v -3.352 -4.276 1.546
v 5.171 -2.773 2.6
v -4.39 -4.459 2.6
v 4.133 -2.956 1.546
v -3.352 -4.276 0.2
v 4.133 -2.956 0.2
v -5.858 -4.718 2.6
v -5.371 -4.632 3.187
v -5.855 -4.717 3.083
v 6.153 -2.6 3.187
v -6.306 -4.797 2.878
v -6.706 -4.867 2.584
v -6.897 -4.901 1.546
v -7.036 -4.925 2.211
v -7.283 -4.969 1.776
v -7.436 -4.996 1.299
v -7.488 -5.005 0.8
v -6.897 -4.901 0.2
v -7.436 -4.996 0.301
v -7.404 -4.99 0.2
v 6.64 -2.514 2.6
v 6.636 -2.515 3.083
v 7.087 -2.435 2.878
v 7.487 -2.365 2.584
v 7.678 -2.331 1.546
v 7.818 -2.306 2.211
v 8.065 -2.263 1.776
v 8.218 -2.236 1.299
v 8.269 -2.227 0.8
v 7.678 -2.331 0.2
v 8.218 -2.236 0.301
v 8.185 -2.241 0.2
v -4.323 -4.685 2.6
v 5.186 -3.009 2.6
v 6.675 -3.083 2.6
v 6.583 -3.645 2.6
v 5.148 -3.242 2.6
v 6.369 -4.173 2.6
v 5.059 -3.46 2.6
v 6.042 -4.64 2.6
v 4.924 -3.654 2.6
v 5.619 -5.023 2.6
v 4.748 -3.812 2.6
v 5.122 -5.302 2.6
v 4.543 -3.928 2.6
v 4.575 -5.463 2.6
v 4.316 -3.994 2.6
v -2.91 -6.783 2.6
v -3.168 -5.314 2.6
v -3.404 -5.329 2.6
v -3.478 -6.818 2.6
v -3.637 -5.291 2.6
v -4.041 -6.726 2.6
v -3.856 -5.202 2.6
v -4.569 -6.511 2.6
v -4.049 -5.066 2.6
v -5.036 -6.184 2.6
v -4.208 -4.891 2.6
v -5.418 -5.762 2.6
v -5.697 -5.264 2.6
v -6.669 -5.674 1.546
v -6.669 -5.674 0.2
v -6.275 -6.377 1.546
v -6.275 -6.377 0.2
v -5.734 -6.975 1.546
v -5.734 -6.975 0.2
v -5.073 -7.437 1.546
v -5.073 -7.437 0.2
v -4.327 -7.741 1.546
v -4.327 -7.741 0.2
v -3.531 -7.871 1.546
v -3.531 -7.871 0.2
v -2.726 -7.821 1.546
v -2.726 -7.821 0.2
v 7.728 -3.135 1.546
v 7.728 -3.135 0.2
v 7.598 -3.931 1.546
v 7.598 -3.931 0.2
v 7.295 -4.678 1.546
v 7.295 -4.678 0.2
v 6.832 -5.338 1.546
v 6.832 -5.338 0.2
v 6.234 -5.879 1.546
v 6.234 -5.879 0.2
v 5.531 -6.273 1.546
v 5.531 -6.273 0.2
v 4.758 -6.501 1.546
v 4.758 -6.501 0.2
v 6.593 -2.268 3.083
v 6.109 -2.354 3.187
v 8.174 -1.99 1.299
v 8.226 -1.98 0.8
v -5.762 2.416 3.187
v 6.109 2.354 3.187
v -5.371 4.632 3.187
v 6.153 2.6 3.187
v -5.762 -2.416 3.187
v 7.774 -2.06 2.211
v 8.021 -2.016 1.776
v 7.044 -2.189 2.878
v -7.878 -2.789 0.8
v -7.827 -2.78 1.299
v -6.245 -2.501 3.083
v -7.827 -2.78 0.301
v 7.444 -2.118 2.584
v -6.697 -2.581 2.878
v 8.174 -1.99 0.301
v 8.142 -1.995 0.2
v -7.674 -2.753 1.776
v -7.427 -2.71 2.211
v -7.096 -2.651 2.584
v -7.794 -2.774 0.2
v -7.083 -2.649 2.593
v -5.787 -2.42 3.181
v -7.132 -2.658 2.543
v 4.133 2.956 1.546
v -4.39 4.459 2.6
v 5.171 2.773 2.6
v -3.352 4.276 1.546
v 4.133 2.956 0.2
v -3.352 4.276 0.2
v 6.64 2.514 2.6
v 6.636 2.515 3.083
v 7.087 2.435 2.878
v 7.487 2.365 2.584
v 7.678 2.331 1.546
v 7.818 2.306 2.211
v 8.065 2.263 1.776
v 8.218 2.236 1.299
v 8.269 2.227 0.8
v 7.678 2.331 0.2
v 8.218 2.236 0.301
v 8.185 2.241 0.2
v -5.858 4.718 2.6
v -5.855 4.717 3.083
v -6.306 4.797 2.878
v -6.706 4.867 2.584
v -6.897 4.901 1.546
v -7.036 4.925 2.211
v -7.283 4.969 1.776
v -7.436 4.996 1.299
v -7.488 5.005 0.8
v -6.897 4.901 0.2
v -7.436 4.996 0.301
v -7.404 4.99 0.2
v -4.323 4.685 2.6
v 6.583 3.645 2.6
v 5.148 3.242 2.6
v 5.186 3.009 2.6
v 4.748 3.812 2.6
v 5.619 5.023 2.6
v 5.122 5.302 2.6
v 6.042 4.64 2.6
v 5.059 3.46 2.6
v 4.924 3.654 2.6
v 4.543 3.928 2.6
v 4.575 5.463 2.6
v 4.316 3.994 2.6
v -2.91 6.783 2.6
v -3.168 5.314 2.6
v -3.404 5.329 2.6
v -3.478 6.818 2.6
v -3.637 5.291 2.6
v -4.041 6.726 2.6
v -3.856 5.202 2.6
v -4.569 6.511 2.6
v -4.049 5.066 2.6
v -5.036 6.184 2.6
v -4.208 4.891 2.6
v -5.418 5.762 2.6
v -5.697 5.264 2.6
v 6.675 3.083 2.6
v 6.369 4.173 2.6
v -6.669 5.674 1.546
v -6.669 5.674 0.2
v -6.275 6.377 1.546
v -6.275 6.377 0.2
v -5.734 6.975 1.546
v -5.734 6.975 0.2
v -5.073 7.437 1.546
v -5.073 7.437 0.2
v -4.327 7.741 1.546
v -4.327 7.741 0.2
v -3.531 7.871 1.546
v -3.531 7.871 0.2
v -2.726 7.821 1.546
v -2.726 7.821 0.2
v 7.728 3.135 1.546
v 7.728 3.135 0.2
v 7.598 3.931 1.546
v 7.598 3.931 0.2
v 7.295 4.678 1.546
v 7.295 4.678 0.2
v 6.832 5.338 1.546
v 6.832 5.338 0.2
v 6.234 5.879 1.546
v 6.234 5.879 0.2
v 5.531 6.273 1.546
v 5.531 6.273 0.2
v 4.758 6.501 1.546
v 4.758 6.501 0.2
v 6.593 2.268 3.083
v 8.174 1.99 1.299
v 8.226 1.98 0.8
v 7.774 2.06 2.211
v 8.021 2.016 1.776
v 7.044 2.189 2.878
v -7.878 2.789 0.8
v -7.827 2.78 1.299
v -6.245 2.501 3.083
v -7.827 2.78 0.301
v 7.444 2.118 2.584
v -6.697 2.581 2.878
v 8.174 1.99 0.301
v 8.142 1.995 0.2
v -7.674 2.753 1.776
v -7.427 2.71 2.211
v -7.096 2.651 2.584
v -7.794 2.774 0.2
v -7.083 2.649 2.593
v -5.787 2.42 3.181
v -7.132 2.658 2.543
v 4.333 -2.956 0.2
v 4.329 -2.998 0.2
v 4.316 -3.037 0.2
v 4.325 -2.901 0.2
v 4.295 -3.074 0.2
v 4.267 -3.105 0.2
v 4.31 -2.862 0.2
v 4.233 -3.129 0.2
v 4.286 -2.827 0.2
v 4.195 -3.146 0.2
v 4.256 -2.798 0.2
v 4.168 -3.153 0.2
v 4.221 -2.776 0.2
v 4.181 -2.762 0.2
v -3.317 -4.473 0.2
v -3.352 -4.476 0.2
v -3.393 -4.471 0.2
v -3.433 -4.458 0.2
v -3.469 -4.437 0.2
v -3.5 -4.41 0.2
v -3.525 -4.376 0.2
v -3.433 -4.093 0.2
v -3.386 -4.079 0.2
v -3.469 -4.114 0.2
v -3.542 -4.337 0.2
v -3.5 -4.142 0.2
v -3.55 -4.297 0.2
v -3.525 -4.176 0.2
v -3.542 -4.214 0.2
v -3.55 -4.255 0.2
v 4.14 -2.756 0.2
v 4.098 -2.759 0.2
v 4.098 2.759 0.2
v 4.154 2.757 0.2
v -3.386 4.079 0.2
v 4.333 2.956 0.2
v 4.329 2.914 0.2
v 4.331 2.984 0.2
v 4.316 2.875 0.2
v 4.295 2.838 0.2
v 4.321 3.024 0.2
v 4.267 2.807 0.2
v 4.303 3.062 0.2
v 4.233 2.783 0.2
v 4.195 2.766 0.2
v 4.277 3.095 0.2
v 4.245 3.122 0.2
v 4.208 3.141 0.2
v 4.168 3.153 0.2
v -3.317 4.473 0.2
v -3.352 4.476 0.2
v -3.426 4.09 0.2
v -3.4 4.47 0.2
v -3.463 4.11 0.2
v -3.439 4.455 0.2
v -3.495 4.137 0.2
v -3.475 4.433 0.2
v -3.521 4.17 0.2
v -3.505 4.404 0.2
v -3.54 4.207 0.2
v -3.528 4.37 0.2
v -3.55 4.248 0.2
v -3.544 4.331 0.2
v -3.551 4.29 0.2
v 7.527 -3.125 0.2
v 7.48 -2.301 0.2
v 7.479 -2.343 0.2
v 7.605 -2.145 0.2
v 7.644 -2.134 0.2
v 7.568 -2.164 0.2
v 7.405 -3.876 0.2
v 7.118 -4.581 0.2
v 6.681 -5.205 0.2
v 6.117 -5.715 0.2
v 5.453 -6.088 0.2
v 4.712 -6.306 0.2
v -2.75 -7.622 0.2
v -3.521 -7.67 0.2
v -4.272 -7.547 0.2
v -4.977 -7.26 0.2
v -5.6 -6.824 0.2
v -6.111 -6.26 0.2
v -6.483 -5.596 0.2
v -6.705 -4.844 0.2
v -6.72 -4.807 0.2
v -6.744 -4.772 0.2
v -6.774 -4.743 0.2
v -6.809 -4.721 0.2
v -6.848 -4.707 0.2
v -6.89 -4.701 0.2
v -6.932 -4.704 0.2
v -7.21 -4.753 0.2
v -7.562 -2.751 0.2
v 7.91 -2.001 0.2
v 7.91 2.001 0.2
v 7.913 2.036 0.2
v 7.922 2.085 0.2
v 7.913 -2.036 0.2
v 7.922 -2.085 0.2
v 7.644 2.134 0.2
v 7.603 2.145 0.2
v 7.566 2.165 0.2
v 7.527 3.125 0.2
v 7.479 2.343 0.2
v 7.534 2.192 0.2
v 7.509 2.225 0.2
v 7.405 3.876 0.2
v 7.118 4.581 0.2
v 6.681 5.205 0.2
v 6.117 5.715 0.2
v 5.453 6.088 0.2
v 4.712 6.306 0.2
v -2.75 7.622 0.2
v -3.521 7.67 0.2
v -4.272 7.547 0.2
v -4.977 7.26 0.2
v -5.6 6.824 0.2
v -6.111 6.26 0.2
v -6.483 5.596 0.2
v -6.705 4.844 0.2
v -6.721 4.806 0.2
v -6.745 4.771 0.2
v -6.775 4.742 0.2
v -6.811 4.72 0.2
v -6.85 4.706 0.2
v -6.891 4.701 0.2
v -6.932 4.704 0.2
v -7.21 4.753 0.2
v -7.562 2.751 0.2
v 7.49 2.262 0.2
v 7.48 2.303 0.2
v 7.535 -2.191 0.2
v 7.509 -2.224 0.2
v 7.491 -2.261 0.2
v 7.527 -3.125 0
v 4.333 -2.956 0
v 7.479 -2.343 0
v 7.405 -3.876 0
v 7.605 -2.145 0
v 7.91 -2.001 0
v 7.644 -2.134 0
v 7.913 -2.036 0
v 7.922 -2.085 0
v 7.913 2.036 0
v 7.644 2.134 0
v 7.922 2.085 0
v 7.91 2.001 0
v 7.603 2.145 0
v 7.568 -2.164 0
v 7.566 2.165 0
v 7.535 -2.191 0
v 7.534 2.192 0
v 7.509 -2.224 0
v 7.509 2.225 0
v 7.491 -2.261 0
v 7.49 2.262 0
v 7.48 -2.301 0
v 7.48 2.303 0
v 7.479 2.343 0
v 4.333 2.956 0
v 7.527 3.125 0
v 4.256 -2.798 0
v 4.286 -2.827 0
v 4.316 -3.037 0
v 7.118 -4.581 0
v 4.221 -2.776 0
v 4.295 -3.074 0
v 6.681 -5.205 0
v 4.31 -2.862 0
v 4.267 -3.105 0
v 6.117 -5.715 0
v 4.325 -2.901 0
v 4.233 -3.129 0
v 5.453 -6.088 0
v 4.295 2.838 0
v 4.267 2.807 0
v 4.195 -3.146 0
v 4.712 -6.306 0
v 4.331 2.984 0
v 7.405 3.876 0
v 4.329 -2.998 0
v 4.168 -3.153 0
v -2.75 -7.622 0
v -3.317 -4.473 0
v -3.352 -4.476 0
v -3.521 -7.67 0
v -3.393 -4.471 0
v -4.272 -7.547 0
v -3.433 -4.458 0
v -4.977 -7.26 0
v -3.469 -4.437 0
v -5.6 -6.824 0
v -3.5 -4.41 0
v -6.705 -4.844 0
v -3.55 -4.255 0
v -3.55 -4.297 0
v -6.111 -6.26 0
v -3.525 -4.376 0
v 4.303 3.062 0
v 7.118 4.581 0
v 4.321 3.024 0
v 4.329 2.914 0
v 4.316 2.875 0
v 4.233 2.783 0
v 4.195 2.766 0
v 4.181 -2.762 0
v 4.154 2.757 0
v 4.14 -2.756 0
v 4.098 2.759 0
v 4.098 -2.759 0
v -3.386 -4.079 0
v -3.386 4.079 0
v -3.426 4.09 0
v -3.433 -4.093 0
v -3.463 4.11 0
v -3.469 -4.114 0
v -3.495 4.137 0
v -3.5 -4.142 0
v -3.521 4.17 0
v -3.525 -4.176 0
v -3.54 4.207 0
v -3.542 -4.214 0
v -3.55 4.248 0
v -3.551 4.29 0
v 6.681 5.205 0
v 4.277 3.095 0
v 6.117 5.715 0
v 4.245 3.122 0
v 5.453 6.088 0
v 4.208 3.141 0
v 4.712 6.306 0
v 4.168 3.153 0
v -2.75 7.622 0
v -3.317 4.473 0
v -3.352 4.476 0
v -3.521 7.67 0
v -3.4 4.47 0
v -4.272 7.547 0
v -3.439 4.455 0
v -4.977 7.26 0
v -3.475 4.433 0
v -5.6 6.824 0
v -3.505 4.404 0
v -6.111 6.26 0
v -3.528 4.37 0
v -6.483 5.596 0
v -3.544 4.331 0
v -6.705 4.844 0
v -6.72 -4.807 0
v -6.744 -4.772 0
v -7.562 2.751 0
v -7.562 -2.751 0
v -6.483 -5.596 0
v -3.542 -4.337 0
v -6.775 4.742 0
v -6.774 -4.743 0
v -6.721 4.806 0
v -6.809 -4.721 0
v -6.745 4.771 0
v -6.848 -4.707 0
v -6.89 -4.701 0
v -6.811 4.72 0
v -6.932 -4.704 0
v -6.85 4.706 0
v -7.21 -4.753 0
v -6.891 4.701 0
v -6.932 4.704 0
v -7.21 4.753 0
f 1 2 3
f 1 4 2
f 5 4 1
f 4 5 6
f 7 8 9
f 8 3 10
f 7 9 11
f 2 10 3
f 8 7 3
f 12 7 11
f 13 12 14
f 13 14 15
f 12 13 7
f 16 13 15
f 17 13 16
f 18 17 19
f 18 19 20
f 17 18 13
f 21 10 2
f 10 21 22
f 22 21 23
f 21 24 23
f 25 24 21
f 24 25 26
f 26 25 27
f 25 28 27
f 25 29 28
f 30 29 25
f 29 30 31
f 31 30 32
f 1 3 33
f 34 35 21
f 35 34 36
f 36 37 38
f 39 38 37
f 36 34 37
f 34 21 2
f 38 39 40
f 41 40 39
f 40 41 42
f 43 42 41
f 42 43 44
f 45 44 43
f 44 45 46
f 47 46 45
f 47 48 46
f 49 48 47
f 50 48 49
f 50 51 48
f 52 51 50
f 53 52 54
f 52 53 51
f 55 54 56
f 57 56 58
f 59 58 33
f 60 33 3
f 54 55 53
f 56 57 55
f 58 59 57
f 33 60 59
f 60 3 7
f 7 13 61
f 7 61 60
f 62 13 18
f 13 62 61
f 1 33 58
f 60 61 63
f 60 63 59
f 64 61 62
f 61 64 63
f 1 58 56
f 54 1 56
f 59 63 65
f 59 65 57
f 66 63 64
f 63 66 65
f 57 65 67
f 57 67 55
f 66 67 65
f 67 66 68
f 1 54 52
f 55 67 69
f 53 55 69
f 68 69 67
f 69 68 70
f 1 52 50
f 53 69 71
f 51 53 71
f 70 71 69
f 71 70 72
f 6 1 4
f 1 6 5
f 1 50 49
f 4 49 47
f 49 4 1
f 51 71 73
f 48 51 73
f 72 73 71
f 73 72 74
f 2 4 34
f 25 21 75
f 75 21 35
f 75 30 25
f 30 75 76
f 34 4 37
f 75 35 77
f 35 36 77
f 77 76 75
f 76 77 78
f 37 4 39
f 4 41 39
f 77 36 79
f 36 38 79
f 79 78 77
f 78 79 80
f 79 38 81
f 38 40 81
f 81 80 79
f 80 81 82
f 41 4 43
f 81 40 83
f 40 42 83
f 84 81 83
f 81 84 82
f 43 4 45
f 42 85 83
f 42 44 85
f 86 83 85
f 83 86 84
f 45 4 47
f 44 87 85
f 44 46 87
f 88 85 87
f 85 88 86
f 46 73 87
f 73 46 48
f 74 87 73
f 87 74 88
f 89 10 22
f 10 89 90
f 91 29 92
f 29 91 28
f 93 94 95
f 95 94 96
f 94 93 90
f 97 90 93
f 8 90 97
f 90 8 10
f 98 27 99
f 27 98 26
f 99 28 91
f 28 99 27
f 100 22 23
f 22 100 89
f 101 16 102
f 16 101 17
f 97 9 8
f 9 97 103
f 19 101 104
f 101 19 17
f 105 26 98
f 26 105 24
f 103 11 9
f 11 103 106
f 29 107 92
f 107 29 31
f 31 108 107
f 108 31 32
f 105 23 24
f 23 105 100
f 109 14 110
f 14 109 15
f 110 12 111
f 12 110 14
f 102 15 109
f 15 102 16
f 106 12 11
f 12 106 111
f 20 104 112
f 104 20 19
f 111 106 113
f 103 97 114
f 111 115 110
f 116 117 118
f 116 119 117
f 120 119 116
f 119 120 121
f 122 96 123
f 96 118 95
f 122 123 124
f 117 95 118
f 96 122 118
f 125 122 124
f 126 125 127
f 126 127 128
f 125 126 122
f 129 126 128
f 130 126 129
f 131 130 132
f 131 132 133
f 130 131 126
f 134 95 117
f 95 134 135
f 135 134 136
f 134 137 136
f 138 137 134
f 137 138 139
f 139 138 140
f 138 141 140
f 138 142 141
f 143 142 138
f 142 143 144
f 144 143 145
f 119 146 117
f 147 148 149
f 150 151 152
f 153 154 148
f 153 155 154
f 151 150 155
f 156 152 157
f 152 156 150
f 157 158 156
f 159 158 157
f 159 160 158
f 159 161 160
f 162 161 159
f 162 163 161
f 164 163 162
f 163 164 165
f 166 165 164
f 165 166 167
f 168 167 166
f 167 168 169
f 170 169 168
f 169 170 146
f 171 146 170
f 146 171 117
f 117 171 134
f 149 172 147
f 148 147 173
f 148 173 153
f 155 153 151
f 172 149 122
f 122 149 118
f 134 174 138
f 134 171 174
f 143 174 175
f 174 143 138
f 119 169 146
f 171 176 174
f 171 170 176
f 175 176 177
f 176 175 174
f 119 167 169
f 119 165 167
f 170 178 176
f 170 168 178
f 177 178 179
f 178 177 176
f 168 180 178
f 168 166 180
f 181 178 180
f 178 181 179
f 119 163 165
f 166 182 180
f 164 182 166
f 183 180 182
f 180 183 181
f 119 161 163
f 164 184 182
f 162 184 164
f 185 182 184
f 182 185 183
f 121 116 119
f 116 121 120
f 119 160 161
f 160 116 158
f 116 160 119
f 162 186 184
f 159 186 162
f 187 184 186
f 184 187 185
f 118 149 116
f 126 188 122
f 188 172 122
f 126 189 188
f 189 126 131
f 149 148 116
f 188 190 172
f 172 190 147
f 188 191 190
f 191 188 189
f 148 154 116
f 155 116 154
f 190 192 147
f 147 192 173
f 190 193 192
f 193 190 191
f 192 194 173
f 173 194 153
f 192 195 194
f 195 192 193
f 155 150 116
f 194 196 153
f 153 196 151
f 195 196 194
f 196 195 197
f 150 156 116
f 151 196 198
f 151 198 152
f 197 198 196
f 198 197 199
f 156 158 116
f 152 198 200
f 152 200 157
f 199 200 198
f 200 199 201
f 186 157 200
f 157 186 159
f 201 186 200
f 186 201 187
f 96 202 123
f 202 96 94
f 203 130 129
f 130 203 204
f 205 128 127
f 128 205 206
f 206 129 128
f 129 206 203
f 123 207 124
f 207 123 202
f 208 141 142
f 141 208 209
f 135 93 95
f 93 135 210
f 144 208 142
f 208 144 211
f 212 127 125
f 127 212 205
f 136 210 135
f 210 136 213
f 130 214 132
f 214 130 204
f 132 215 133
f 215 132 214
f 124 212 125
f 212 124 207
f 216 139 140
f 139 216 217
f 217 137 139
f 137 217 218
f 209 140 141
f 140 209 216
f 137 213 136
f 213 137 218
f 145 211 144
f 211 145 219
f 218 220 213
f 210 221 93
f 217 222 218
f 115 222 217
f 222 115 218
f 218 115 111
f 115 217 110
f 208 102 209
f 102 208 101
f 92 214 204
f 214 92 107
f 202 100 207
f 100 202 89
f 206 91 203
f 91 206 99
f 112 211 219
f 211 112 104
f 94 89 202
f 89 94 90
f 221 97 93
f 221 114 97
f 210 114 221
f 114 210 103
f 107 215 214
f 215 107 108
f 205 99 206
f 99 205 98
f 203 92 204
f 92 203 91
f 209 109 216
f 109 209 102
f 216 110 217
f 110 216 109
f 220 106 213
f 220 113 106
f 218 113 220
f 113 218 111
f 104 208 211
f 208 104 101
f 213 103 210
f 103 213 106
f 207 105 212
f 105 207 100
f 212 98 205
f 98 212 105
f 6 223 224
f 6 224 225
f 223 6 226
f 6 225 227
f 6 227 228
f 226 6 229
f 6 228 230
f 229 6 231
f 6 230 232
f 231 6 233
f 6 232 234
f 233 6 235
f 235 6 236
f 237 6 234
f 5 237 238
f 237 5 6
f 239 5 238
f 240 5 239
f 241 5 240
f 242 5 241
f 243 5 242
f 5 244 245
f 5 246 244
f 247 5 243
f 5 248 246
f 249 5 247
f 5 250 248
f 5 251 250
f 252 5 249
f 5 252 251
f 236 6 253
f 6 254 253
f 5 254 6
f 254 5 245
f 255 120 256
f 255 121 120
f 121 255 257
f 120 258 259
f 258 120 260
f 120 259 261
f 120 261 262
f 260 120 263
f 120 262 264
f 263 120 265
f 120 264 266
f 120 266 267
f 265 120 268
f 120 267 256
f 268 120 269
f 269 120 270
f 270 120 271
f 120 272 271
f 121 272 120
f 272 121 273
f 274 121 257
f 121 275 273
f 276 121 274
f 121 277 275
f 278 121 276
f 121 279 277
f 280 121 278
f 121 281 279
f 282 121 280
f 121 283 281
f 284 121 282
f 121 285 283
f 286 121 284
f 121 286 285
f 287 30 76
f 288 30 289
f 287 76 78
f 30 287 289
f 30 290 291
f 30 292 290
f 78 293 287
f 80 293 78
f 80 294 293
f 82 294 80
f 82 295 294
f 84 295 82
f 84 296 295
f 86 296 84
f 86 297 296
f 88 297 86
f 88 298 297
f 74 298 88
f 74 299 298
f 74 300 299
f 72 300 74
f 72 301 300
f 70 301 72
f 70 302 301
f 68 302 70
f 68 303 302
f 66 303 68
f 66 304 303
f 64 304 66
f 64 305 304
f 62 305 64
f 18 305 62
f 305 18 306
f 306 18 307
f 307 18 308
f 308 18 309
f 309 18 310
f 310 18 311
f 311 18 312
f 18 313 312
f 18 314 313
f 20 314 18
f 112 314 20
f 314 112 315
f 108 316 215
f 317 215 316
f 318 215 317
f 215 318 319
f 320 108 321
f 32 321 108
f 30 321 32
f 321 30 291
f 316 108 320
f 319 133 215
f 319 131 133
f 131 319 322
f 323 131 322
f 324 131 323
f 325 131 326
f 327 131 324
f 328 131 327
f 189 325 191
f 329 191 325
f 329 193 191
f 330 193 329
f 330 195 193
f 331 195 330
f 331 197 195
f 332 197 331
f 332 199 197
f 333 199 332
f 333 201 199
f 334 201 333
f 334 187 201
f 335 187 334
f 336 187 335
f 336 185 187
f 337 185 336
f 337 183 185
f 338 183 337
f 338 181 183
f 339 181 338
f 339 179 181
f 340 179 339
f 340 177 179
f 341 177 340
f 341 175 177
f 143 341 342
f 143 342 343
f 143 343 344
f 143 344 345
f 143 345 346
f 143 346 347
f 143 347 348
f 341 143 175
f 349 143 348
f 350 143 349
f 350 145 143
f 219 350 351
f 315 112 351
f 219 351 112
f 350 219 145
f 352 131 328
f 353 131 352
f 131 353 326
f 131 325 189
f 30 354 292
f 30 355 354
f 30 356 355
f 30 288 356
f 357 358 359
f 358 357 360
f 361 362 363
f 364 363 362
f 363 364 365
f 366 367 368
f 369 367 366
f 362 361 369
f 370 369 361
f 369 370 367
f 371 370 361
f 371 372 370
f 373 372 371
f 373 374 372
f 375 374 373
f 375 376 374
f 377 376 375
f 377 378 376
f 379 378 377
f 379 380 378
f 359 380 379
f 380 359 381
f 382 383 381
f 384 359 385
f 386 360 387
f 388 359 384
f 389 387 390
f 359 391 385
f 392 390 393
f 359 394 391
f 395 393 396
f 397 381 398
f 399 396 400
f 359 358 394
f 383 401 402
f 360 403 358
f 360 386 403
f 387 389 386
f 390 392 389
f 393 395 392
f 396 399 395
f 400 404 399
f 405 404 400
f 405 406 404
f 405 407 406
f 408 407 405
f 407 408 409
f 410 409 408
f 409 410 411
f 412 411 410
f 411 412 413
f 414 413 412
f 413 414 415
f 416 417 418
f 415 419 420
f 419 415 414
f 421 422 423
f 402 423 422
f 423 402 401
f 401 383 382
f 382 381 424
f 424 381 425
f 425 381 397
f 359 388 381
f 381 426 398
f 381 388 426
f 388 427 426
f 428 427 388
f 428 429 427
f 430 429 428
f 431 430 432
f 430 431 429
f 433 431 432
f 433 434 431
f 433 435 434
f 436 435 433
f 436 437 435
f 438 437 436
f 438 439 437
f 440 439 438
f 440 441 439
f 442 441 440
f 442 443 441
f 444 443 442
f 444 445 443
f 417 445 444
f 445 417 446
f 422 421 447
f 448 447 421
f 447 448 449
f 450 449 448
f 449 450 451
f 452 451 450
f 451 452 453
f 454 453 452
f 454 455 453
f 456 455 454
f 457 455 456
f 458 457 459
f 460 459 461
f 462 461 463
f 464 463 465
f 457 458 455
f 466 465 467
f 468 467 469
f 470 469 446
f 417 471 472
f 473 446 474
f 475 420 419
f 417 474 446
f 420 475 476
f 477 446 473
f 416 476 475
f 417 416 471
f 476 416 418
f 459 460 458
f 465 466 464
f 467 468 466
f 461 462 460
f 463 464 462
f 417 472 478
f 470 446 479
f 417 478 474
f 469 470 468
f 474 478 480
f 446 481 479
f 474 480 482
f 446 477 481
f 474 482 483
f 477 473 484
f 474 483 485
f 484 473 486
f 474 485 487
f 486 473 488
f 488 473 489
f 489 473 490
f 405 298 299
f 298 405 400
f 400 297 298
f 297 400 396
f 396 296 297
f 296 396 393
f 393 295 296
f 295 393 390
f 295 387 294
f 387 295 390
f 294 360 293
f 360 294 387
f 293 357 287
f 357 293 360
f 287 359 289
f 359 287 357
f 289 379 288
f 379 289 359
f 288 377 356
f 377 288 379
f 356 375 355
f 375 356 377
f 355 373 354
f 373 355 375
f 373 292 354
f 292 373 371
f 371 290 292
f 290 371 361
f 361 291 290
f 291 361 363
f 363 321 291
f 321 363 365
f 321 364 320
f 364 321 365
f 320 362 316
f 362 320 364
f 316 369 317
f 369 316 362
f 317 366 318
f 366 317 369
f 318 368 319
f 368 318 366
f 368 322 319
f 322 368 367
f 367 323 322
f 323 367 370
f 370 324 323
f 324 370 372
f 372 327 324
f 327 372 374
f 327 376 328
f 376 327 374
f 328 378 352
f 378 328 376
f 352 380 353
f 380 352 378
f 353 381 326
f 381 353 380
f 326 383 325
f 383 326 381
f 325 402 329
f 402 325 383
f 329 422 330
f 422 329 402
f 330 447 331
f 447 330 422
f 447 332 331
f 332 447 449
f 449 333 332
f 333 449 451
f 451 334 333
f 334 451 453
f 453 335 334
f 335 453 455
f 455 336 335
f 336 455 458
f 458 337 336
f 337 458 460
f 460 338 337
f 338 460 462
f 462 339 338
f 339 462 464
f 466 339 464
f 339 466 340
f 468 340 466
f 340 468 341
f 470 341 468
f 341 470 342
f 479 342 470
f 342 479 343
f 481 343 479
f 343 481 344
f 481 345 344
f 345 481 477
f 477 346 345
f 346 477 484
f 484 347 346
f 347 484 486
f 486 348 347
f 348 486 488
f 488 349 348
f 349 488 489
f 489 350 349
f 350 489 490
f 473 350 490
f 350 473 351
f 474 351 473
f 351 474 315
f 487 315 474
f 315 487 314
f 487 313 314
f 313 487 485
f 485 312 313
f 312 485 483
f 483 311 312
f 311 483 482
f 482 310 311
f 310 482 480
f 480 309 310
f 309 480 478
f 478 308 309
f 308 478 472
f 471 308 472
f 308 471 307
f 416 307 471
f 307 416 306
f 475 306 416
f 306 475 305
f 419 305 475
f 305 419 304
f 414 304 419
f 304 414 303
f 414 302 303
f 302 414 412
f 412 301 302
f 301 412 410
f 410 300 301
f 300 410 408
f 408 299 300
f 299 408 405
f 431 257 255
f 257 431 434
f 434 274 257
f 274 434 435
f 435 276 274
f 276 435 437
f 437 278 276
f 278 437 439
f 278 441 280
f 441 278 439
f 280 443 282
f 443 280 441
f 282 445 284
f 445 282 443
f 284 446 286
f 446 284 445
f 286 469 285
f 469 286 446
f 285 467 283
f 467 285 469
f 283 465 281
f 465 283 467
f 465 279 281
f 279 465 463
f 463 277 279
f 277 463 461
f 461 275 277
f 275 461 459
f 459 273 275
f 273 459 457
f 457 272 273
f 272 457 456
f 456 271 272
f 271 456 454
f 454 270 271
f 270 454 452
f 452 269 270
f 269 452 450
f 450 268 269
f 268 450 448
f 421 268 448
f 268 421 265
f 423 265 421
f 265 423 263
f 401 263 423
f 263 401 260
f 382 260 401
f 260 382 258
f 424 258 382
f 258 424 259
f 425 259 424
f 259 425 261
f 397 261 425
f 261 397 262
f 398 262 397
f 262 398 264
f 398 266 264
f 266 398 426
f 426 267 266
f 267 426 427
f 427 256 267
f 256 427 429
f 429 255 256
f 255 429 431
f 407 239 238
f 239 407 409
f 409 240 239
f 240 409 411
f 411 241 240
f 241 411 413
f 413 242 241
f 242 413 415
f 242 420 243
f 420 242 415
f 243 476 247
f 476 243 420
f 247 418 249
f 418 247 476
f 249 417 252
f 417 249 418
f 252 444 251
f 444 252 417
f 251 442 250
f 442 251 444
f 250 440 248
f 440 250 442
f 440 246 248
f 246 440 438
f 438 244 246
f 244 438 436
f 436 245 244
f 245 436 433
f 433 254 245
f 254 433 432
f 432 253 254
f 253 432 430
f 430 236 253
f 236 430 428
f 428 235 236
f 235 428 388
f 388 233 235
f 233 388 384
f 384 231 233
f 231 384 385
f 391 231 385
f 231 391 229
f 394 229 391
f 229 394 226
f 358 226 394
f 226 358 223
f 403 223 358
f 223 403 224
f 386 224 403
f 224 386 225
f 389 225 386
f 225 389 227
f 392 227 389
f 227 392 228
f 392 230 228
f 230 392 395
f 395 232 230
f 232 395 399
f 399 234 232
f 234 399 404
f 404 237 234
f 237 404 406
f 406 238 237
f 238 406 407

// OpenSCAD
width = 4.5;
depth = 2.4;
height = 16;
$fn = 30;

inset = 0.6;
pipe_radius = depth - inset;

module middle() {
  rotate([90, 0, 0]) {
    hull()
      for (x = [depth, height-depth])
        translate([x, 0, 0])
          cylinder(h=width, r=depth);
  }
}

module octagon() {
  intersection_for(a = [0, 45])
    rotate([0, 0, a])
      square(pipe_radius*2, center=true);
}

module elbow() {
  rotate_extrude(angle = 90)
    translate([pipe_radius, 0])
      octagon();
}

module pipe_pack() {
  translate([-height/2, width/2, 0])
    middle();
  
  for (a = [-1, 1]) {
    scale([1, a]) {
      for (b = [-1, 1])
        scale([b, 1])
          translate([height/2 - pipe_radius - depth, width/2, 0])
            elbow();
      translate([-height/2 + pipe_radius + depth, width/2 + pipe_radius, 0])
        rotate([0, 90, 0])
          linear_extrude(height - 2*pipe_radius - 2*depth)
            octagon();
    }
  }
}

module tilted_pack() {
  for (a = [-1, 1]) {
    scale([1, a]) {
      translate([0, 1.4]) {
        rotate([0, 0, -10]) {
          intersection() {
            pipe_pack();
            translate([0, 50, 0])
              cube(100, center=true);
          }
        }
      }
    }
  }
  hull() {
    for (a = [-1, 1]) {
      scale([1, a]) {
        translate([0, 1.4]) {
          rotate([0, 0, -10]) {
            intersection() {
              pipe_pack();
              translate([0, 1, 0])
                cube([100, 2, 100], center=true);
            }
          }
        }
      }
    }
  }
}

module half() {
  difference() {
    translate([0, 0, 0.8])
      tilted_pack();
    translate([0, 0, -500])
      cube(1000, center=true);
  }
}

module print() {
  linear_extrude(0.2)
    offset(-0.2)
      projection(cut = true)
        translate([0, 0, -0.1])
          half();
  intersection() {
    half();
    translate([0, 0, 500.2])
      cube(1000, center=true);
  }
}

print();
